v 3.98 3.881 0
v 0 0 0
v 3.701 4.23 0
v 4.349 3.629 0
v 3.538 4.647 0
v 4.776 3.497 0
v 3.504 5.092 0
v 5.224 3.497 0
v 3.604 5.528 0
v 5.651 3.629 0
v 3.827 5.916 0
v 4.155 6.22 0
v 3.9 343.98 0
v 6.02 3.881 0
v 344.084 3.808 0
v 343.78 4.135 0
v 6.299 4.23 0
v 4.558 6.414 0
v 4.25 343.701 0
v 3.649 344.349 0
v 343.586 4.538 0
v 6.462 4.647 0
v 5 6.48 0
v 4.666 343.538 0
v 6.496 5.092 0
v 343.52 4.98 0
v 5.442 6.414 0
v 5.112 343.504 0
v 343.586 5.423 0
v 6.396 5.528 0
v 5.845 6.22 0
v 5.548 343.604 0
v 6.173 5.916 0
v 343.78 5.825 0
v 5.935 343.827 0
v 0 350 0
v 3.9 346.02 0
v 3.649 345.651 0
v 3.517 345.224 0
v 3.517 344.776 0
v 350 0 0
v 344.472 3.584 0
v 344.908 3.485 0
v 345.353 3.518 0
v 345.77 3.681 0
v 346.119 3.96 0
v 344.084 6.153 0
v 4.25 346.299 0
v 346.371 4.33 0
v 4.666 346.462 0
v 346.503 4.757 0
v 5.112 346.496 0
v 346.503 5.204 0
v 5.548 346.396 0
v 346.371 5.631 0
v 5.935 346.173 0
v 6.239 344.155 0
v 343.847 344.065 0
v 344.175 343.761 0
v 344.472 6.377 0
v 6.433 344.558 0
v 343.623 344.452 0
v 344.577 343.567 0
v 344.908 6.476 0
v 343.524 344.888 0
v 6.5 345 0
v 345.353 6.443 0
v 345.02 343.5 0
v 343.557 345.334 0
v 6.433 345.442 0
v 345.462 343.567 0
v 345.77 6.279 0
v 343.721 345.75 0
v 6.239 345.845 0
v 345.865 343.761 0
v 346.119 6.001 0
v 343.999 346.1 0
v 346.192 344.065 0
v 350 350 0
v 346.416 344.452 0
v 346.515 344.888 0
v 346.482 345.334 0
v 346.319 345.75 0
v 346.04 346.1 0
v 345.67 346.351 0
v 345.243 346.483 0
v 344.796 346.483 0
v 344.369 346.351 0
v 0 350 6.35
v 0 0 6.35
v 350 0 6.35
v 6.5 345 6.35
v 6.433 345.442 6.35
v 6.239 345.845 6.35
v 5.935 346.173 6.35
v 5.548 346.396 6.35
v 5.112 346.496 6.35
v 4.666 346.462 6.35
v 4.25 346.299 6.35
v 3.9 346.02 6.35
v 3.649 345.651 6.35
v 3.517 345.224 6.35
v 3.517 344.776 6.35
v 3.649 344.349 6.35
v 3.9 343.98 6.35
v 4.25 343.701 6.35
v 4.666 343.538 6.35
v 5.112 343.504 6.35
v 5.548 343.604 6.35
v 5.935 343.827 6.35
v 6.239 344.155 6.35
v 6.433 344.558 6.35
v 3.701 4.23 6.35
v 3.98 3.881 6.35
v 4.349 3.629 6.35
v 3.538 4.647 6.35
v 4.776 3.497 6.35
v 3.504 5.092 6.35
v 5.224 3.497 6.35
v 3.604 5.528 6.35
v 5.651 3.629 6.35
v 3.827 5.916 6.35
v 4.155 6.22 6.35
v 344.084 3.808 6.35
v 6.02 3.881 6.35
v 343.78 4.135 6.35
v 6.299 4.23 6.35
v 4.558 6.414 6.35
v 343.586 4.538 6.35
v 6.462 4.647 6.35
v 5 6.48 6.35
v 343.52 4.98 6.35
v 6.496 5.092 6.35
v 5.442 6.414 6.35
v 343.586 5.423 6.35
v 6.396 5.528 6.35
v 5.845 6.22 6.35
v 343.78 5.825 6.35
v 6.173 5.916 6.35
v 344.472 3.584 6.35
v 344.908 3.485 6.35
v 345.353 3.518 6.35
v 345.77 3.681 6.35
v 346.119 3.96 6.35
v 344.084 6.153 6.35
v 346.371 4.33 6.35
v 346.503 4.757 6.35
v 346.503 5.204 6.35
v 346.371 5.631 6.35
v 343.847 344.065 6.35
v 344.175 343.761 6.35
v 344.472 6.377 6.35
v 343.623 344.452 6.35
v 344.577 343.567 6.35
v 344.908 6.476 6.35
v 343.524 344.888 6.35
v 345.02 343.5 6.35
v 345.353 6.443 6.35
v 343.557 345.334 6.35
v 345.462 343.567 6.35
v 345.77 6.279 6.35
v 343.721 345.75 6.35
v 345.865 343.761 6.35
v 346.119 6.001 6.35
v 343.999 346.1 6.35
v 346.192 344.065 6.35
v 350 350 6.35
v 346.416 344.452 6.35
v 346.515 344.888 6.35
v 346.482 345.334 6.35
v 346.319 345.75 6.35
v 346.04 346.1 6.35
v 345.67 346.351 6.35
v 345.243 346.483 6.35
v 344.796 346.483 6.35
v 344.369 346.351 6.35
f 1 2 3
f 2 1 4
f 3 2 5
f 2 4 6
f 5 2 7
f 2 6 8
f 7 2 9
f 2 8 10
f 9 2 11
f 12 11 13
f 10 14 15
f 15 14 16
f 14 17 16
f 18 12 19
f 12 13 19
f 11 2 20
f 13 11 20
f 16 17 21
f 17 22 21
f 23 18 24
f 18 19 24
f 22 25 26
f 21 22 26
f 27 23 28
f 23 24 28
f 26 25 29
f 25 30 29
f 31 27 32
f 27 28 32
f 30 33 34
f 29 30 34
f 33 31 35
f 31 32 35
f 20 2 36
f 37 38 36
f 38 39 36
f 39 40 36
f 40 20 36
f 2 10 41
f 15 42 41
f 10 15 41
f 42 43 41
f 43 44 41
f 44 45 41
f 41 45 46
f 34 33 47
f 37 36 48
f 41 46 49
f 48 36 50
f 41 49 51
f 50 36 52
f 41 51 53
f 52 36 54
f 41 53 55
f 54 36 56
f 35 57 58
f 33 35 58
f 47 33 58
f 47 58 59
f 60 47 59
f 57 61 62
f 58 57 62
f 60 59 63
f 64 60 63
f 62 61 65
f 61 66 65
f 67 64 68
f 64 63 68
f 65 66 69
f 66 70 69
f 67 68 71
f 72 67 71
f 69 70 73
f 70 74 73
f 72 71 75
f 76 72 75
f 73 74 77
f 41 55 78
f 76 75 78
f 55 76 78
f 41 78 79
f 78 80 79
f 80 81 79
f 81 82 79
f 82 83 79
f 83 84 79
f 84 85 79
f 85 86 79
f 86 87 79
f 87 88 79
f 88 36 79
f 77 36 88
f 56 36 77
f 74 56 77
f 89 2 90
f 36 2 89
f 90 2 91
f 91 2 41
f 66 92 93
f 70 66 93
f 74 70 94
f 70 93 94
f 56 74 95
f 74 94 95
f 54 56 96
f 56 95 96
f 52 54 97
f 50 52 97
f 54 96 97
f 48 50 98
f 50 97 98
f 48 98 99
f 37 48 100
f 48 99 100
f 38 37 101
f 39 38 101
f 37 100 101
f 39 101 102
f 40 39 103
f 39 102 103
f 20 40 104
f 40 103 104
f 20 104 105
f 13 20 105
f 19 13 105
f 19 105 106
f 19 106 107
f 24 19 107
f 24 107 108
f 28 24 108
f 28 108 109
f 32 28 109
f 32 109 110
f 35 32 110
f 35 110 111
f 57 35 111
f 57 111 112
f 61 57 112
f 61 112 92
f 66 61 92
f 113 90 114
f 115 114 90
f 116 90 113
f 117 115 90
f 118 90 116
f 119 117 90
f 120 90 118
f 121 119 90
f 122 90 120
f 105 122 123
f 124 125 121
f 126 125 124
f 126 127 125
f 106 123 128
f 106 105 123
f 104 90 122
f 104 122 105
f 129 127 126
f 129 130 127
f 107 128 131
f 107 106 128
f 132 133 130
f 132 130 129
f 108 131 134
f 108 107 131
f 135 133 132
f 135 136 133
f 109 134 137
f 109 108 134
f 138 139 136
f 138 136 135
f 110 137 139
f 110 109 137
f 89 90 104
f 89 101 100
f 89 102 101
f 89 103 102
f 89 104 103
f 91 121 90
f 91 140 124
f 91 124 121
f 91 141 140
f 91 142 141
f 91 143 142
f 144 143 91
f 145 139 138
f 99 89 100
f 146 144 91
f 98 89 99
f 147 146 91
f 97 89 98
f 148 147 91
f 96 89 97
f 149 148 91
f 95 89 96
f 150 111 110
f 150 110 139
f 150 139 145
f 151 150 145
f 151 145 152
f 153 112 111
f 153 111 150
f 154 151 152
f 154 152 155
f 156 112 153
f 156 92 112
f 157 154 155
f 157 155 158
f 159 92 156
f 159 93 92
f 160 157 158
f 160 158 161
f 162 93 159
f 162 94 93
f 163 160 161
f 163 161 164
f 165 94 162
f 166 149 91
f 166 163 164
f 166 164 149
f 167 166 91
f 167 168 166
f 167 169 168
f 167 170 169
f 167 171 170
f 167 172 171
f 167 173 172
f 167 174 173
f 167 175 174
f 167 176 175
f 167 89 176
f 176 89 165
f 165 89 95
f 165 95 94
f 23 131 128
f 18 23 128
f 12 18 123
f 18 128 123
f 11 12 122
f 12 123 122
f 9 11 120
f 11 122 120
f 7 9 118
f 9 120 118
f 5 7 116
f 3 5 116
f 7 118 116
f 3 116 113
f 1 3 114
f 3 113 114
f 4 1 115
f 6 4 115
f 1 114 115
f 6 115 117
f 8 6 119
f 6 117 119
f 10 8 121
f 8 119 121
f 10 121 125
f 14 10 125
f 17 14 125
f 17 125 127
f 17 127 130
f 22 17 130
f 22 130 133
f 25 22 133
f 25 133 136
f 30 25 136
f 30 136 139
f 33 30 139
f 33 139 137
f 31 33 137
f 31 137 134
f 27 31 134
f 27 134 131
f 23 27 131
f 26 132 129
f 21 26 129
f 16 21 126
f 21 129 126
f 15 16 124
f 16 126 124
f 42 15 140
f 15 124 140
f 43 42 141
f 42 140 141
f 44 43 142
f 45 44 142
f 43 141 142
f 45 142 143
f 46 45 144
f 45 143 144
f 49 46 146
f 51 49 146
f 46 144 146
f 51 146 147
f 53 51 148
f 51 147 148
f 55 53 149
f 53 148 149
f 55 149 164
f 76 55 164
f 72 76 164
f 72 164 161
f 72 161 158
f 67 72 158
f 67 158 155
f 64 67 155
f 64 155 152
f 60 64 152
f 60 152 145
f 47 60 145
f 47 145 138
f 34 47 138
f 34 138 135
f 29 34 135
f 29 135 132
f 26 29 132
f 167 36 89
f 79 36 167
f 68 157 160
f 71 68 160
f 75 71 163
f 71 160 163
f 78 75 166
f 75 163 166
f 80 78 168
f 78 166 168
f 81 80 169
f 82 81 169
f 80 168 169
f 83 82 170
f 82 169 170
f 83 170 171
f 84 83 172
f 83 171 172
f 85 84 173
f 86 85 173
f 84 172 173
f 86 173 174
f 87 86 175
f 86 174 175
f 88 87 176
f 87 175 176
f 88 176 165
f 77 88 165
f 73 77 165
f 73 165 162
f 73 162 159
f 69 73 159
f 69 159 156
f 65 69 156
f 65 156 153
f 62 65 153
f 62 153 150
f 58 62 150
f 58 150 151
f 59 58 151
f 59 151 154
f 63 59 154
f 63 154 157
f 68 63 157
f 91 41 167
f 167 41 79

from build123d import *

# Parameters (mm, degrees)
SKETCH1_W           = 350
SKETCH1_H           = 350
BOSS_EXTRUDE1_DEPTH = 6.35
SKETCH2_R           = 1.5
CUT_EXTRUDE1_DEPTH  = 10
CIRPATTERN1_COUNT   = 4


with BuildPart() as part:
    # Sketch1 → Boss-Extrude1 (new body)
    with BuildSketch(Plane.XY):
        with Locations((175, 175)):
            Rectangle(SKETCH1_W, SKETCH1_H)
    extrude(amount=BOSS_EXTRUDE1_DEPTH)

    # Sketch2 → Cut-Extrude1 (cut)
    with BuildSketch(Plane.XY.offset(6.35)):
        with Locations((5, 345)):
            Circle(SKETCH2_R)
    cut_extrude1 = extrude(amount=-CUT_EXTRUDE1_DEPTH, mode=Mode.SUBTRACT)

    # CirPattern1: Cut-Extrude1 ×4 about axis
    cirpattern1_axis = Axis((175.009810029, 174.990189971, 0), (0, 0, 1))
    for i in range(1, CIRPATTERN1_COUNT):
        add(cut_extrude1.rotate(cirpattern1_axis, i * 360 / CIRPATTERN1_COUNT), mode=Mode.SUBTRACT)


solid = part.part
